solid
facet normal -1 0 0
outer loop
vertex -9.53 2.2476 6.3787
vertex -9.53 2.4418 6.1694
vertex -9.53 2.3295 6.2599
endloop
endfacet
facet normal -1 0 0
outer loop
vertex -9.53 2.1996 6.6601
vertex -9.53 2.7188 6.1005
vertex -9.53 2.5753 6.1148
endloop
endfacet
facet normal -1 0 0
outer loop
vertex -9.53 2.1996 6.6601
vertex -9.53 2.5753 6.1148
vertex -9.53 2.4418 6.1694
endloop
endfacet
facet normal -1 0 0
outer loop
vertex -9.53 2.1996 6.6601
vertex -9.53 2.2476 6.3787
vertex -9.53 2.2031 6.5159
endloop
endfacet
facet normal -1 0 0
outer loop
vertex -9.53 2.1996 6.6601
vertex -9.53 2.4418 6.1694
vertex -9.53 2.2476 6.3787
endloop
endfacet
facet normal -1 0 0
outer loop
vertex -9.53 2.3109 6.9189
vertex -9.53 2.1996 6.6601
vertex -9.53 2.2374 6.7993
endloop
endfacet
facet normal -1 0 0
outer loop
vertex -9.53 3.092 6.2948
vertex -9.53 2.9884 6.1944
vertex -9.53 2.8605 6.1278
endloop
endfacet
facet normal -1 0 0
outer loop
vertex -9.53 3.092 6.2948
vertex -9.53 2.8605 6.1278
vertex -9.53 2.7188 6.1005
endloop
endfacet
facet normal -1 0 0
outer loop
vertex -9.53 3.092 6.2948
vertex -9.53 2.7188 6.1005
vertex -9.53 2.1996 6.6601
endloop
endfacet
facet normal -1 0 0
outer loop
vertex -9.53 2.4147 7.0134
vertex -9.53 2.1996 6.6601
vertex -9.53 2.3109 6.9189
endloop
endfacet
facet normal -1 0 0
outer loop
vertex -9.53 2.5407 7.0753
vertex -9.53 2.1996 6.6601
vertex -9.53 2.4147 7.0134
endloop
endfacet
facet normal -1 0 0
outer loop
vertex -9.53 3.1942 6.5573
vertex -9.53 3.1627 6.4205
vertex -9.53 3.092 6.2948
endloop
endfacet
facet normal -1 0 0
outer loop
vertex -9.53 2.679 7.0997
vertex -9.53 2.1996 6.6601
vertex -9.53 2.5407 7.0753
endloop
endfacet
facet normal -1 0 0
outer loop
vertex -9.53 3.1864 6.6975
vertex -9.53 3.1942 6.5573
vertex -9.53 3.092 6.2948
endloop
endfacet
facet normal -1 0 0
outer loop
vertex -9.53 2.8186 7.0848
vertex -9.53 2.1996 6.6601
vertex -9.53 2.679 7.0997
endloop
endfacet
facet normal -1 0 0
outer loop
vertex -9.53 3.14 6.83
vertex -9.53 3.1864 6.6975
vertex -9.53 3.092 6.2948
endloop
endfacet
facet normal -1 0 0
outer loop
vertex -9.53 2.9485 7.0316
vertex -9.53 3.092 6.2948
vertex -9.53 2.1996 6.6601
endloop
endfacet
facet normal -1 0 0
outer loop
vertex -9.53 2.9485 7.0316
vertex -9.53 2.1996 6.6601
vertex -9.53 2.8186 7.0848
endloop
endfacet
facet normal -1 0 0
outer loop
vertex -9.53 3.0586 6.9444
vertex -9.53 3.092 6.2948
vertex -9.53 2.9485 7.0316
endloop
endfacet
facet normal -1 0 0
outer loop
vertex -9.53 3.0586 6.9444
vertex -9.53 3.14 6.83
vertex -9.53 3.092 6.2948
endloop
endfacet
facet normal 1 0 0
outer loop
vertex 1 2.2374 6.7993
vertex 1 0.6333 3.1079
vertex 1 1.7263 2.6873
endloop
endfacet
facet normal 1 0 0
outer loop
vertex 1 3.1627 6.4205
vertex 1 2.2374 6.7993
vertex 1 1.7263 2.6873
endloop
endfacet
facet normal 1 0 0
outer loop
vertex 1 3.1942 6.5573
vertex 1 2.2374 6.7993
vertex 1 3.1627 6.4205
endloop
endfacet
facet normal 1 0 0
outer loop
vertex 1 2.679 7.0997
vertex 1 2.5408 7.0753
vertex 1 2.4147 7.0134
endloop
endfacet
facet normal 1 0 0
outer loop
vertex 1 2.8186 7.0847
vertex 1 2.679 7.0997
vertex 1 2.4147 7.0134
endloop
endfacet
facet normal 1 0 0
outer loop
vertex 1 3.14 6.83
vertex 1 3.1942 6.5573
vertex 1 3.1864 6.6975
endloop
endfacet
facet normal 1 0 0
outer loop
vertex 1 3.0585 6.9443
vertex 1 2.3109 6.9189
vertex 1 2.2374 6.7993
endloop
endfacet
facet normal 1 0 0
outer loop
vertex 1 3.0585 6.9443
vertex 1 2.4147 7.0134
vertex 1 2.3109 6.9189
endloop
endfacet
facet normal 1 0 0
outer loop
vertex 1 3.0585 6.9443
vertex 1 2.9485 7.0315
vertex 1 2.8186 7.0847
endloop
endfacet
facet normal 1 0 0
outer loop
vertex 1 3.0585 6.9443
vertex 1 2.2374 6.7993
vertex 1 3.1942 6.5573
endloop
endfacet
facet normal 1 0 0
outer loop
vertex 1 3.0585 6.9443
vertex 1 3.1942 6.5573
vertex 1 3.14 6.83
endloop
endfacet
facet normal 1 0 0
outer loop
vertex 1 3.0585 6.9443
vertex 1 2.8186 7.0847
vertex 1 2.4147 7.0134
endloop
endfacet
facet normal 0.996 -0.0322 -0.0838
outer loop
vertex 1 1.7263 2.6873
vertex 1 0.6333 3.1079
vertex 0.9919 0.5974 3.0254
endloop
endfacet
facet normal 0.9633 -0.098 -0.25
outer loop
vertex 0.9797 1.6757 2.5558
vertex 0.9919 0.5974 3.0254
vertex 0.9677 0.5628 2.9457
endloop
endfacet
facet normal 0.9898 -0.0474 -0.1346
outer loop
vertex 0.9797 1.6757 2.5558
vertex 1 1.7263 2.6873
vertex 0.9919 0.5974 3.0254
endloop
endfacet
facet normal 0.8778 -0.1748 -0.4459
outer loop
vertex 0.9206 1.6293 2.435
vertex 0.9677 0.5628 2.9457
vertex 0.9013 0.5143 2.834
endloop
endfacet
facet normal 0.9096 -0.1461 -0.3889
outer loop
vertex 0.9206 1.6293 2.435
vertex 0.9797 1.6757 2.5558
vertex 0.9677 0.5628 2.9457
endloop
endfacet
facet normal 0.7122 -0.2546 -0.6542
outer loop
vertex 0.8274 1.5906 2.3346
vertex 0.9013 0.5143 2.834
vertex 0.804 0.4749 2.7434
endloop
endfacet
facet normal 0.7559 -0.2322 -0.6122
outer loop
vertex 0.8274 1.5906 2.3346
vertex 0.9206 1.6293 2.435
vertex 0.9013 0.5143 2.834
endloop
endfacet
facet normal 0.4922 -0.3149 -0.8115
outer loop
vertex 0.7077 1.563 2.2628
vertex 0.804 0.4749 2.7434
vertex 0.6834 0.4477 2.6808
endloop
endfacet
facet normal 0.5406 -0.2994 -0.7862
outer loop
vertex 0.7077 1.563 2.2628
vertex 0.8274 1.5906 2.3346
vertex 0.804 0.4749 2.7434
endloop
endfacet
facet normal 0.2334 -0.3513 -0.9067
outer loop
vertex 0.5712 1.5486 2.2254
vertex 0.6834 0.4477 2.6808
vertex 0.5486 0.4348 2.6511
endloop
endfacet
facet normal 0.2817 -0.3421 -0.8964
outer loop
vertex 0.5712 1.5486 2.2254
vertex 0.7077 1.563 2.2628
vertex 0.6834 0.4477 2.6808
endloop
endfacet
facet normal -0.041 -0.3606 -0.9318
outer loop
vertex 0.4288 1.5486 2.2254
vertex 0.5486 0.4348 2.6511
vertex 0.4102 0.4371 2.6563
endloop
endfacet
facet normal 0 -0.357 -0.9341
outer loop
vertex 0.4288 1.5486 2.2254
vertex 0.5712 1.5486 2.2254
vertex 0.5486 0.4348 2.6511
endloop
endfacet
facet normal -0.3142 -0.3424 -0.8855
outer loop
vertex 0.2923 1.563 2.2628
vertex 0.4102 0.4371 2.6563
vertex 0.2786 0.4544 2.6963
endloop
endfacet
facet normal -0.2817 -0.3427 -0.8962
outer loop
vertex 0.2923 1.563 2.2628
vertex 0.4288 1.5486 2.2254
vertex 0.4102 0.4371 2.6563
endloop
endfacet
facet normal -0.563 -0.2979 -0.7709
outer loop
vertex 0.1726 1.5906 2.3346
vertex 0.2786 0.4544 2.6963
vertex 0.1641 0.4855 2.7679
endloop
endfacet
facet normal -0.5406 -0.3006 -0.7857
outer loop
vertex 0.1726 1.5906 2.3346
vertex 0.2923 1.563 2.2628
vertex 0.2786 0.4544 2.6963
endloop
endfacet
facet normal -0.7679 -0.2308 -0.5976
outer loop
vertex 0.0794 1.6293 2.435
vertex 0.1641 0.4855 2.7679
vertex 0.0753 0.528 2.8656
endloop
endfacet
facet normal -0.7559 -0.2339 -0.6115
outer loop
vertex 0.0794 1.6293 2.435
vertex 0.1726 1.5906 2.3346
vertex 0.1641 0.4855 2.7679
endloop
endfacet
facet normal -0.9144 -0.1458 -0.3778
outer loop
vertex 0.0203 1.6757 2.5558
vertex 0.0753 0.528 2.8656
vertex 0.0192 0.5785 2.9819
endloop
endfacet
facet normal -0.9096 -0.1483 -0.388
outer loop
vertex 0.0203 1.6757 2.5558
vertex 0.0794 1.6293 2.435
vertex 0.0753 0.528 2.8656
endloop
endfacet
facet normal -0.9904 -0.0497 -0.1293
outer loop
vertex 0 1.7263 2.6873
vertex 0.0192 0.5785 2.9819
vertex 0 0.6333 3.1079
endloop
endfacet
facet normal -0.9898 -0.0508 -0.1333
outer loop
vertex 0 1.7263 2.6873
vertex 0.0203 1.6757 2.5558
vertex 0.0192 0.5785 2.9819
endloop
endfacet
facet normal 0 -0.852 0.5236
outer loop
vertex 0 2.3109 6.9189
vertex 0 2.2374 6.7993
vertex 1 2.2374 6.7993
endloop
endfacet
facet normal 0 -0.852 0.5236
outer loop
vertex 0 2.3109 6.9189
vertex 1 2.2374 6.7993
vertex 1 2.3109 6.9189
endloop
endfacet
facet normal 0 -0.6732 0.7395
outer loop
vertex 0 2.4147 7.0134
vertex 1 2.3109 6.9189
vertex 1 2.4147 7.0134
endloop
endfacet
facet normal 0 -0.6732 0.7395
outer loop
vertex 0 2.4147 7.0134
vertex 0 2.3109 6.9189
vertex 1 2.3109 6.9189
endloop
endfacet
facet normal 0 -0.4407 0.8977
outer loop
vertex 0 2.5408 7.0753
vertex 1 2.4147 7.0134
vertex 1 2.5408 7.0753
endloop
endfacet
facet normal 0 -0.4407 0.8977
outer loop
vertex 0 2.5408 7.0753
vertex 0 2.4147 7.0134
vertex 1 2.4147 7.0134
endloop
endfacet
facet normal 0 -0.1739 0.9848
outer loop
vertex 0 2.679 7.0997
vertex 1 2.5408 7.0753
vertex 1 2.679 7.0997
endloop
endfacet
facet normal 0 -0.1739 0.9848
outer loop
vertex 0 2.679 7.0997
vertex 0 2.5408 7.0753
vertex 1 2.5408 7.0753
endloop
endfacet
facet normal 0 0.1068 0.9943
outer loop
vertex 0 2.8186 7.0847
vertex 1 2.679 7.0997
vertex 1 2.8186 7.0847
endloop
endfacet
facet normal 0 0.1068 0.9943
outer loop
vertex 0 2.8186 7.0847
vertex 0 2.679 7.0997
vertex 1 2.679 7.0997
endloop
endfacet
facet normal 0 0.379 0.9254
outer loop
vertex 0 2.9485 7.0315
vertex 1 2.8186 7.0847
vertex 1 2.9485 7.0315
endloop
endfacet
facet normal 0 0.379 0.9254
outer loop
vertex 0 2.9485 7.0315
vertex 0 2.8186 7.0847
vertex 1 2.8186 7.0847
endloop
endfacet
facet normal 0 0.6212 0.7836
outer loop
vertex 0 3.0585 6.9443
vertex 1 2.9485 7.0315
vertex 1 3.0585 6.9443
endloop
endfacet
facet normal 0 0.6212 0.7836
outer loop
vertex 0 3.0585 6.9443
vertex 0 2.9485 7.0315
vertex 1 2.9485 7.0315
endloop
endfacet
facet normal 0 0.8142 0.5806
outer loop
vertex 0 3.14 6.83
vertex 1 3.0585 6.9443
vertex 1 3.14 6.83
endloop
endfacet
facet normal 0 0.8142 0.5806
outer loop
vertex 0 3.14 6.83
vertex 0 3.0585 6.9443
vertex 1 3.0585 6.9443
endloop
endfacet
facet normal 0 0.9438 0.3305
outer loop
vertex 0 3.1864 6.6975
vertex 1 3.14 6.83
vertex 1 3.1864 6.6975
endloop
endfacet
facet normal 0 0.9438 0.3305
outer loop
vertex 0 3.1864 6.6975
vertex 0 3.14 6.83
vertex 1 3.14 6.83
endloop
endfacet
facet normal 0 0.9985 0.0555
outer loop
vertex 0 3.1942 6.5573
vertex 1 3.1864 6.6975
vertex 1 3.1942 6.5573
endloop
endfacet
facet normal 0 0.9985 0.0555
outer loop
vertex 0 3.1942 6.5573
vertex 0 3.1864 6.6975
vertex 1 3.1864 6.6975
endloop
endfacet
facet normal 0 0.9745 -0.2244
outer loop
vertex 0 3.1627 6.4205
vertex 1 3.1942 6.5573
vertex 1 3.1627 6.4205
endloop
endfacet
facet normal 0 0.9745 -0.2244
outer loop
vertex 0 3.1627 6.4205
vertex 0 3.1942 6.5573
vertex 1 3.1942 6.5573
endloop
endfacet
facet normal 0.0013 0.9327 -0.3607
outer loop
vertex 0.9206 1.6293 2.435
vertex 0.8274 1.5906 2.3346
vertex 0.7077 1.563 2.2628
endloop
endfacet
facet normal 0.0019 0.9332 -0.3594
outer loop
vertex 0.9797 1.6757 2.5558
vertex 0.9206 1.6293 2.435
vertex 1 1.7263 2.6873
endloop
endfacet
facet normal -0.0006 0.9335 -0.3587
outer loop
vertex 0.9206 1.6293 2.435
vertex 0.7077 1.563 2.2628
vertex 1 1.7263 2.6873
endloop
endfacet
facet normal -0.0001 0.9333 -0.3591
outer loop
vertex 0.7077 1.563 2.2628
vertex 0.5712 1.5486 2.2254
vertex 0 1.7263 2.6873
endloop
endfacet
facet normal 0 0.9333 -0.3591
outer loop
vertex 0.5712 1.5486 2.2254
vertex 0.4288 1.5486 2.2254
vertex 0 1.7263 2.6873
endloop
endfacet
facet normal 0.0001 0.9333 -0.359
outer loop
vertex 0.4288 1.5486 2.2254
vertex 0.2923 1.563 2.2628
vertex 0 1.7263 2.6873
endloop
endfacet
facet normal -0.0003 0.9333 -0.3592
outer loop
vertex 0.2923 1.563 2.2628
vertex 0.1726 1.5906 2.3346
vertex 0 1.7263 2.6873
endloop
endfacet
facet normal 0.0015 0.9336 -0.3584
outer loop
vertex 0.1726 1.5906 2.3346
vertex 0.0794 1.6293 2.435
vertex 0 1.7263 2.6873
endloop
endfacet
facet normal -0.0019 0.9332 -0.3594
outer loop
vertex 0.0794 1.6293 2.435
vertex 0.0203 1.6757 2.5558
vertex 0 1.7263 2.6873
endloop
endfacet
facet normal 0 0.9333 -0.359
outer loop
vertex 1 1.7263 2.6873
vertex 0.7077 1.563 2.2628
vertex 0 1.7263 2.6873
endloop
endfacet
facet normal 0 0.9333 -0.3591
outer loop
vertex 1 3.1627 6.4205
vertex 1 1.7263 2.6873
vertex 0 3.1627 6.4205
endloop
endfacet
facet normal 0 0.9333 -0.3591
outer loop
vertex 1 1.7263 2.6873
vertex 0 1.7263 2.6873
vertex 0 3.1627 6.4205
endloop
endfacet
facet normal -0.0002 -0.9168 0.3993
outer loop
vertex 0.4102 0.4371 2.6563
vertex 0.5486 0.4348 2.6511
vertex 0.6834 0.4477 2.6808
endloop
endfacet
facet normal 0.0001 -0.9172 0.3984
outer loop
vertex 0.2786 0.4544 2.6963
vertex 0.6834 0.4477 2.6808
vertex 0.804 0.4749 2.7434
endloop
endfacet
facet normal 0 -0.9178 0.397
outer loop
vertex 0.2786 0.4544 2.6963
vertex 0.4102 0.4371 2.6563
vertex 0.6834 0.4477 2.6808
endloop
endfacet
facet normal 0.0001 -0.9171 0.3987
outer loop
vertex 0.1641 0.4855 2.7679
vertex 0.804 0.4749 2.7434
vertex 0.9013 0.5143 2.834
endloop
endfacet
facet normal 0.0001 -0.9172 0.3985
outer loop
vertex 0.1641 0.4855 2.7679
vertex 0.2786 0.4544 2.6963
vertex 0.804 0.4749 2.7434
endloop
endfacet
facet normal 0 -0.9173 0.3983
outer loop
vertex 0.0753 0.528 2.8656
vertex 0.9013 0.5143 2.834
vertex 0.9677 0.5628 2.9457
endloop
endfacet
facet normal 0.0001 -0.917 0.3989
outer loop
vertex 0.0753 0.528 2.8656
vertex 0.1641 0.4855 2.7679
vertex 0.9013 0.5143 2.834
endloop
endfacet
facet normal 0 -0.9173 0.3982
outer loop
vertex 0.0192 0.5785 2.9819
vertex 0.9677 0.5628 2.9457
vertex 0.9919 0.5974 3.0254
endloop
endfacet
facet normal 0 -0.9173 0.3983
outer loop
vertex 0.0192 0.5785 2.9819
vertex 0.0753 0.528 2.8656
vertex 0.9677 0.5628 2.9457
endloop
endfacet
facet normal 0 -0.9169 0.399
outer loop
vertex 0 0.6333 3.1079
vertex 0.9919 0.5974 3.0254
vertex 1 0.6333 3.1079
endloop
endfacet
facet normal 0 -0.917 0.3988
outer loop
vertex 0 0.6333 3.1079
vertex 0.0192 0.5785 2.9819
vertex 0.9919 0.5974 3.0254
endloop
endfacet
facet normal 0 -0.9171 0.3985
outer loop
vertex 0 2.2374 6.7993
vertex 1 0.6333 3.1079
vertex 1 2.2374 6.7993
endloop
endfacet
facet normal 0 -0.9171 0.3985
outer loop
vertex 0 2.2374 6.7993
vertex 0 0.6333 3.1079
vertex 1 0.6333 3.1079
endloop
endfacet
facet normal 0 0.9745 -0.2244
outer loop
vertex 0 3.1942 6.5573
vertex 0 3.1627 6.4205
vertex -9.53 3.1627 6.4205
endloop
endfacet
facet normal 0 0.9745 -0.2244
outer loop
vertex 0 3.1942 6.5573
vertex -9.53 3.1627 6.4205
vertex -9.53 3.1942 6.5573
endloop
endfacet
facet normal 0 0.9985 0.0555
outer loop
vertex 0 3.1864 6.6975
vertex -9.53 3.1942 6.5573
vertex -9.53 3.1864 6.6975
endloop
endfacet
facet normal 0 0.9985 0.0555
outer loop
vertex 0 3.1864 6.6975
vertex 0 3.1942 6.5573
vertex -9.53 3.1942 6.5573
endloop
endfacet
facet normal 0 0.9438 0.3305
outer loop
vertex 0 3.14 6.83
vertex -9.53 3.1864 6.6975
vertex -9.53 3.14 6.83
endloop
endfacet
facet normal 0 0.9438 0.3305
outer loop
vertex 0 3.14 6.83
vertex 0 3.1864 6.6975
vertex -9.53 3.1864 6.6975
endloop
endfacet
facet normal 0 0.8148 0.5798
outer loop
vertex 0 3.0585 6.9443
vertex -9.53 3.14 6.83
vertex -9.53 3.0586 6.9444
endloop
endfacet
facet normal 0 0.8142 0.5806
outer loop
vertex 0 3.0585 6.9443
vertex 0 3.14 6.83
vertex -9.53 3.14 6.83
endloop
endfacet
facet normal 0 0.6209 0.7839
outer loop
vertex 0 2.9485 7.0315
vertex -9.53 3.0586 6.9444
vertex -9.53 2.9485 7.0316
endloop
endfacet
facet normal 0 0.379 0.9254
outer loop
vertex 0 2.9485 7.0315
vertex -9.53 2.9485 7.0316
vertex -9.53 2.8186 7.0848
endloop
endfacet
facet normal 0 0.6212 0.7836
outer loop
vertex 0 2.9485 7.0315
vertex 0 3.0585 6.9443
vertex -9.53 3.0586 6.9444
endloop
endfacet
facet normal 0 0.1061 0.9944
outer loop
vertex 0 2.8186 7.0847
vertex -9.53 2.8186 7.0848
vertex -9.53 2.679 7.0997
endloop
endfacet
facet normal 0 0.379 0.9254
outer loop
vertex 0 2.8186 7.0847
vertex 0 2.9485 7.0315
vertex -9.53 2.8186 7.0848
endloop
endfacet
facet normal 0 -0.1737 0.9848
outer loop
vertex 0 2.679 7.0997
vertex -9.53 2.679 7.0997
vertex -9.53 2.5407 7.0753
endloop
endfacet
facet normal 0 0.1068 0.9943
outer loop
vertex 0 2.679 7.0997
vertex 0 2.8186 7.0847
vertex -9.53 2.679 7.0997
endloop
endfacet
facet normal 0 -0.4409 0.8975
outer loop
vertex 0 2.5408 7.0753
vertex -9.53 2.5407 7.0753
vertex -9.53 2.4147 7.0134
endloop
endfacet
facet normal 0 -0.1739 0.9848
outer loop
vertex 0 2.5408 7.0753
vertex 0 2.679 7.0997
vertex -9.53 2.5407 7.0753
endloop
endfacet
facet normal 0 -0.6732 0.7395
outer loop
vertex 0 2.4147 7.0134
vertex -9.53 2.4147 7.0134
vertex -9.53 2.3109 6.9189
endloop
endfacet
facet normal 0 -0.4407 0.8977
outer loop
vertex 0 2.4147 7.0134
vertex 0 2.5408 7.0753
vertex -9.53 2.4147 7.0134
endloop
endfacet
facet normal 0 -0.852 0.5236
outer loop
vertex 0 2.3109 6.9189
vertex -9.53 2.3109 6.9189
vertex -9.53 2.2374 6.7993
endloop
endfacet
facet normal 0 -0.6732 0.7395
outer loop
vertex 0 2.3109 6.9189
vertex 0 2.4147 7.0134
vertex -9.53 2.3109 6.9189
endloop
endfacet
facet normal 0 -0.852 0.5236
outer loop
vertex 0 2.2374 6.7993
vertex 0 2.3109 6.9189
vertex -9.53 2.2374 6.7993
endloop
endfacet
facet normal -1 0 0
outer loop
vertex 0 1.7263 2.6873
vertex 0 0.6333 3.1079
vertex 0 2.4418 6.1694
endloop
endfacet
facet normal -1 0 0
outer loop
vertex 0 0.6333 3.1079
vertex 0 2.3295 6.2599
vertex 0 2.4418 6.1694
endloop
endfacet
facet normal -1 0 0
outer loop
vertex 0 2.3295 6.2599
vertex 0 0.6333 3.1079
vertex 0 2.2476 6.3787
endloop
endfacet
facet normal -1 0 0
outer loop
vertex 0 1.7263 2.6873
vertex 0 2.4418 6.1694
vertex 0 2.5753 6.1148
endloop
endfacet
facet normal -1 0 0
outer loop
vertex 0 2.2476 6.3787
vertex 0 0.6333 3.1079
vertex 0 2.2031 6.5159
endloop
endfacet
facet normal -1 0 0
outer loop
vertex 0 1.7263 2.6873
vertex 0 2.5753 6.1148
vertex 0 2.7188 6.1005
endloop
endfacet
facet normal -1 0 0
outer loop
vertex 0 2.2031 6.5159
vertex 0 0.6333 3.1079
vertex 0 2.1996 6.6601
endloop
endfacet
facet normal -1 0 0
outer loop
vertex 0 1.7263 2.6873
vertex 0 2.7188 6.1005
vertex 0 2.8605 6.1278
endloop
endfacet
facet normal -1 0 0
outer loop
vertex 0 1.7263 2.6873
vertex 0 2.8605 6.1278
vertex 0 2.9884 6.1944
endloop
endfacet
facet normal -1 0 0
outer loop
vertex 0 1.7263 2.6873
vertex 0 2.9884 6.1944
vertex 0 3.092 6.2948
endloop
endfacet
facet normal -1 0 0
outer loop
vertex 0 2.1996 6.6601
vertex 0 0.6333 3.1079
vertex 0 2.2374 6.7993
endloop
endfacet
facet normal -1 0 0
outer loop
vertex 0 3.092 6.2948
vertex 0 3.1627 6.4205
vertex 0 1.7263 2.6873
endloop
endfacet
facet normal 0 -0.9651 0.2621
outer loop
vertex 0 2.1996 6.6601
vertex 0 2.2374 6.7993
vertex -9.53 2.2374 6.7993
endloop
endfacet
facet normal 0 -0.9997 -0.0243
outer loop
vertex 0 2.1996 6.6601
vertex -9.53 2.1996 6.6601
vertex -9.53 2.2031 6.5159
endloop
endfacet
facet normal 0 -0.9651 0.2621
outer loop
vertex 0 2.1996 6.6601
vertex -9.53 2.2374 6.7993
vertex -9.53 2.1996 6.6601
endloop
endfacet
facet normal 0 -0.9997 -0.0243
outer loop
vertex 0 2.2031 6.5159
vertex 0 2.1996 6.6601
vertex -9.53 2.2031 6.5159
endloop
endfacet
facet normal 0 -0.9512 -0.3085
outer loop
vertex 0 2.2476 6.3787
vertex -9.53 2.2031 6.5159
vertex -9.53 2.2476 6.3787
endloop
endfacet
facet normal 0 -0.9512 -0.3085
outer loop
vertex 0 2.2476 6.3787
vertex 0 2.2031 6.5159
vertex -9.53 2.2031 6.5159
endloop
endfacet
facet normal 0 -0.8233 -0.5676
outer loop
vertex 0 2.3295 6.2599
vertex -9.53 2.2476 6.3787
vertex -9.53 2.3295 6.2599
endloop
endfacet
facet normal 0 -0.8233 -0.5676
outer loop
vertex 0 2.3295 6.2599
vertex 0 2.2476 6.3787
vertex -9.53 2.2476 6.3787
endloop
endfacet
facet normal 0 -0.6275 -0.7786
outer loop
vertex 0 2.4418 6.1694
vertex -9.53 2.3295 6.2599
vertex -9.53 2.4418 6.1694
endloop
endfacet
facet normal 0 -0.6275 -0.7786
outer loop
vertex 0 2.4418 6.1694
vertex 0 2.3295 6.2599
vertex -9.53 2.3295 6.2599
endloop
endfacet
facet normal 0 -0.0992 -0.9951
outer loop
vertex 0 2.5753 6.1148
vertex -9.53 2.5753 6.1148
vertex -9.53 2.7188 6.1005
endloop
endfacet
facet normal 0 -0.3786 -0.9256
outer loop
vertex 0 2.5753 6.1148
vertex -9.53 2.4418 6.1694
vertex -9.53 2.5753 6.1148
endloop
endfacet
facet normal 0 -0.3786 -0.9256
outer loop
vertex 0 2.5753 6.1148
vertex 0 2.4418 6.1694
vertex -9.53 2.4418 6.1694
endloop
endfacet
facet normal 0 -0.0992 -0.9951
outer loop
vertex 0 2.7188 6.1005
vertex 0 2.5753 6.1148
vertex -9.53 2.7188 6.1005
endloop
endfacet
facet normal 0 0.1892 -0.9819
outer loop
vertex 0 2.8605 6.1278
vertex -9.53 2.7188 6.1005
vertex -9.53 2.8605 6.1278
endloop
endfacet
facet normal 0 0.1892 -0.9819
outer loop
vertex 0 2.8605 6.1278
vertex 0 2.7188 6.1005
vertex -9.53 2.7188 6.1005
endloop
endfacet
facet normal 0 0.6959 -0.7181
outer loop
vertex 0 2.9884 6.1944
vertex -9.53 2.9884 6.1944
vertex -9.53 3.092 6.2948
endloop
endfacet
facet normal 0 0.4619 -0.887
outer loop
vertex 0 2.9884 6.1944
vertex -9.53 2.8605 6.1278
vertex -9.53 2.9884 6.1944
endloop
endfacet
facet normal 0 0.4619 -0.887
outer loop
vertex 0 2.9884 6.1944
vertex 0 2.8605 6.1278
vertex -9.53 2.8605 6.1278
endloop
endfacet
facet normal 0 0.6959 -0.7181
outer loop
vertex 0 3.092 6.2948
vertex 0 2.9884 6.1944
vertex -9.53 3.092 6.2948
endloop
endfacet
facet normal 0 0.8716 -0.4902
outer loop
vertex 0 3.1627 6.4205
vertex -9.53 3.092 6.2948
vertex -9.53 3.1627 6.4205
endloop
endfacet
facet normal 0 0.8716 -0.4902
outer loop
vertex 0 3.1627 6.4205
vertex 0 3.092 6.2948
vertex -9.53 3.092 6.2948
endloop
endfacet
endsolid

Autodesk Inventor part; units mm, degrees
ref_plane "YZ Plane" through (0, 0, 0) normal (1, 0, 0) x (0, 1, 0)
ref_plane "XZ Plane" through (0, 0, 0) normal (0, 1, 0) x (-1, 0, 0)
ref_plane "XY Plane" through (0, 0, 0) normal (0, 0, 1) x (1, 0, 0)
sketch "Sketch1" plane through (0, 0, 0) normal (1, 0, 0) x (0, 1, 0)
  line L0 (0, 0) -> (2.696, 0)
  line L1 (2.696, 0) -> (2.696, 6.6)
  circle A0 centre (2.696, 6.6) radius 0.5
  line L2 (-0.5, 0.5) -> (0.5, 0.5)
  line L3 (0.5, 0.5) -> (0.5, -0.5)
  line L4 (0.5, -0.5) -> (-0.5, -0.5)
  line L5 (-0.5, -0.5) -> (-0.5, 0.5)
  line L6 (-0.5, 0.5) -> (0.5, -0.5) construction
  line L7 (0.5, 0.5) -> (-0.5, -0.5) construction
  line L8 (0.5, -0.5) -> (3.1627, 6.4205)
  line L9 (-0.5, 0.5) -> (2.2374, 6.7993)
  dimension "d0" = 2.696
  dimension "d1" = 6.6
  dimension "d2" = 1
  dimension "d3" = 1
  dimension "d4" = 1
extrude "Extrusion1" add sketch "Sketch1" along normal blind 1 contours L3 L2 L9 A0 L1 L8 L0 | L3 L4 L5 L2 | L0 L8 L3 | L1 A0 L8 | A0
sketch "Sketch2" plane through (0, 0, 0) normal (-1, 0, 0) x (0, 0, 1)
  line L0 (-0.5, -0.5) -> (0.5, -0.5)
  line L1 (0.5, -0.5) -> (0.5, 0.5)
  line L2 (0.5, 0.5) -> (-0.5, 0.5)
  line L3 (-0.5, 0.5) -> (-0.5, -0.5)
  line L4 (-0.5, -0.5) -> (0.5, 0.5) construction
  line L5 (0.5, -0.5) -> (-0.5, 0.5) construction
  arc A0 (6.7993, 2.2374) -> (6.4205, 3.1627) centre (6.6, 2.696) ccw projected
  circle A1 centre (6.6, 2.696) radius 0.5
  point P0 (0, 0)
  point P1 (6.4205, 3.1627)
  point P2 (6.7993, 2.2374)
  dimension "d7" = 1
  dimension "d8" = 1
extrude "Extrusion2" add sketch "Sketch2" along normal blind 9.53
sketch "Sketch3" plane through (0, 3.1627, 6.4205) normal (0, 0.9333, -0.3591) x (1, 0, 0)
  line L0 (1, 7.415) -> (1, 0) projected
  line L1 (1, 0) -> (1, 4)
  line L2 (1, 4) -> (0, 4)
  line L3 (0, -0.0213) -> (0, 6.8408) projected
  circle A0 centre (0.5, 4) radius 0.5
  line L4 (1, 4) -> (2.2974, 4.6522)
  line L5 (2.2974, 4.6522) -> (2.4132, 8.4295)
  line L6 (2.4132, 8.4295) -> (-8.5006, 8.8849)
  line L7 (-8.5006, 8.8849) -> (-10.8473, 7.9695)
  line L8 (-10.8473, 7.9695) -> (-9.9233, 6.1312)
  line L9 (-9.9233, 6.1312) -> (-3.8147, 5.4684)
  line L10 (-3.8147, 5.4684) -> (0, 4)
  point P0 (0, 7.1279)
  point P1 (1, 4)
  dimension "d11" = 4
extrude "Extrusion3" cut sketch "Sketch3" against normal blind 10 contours A0 L10 L9 L8 L7 L6 L5 L4
properties part number "Radius_Bone1_Joint_UPPER"
